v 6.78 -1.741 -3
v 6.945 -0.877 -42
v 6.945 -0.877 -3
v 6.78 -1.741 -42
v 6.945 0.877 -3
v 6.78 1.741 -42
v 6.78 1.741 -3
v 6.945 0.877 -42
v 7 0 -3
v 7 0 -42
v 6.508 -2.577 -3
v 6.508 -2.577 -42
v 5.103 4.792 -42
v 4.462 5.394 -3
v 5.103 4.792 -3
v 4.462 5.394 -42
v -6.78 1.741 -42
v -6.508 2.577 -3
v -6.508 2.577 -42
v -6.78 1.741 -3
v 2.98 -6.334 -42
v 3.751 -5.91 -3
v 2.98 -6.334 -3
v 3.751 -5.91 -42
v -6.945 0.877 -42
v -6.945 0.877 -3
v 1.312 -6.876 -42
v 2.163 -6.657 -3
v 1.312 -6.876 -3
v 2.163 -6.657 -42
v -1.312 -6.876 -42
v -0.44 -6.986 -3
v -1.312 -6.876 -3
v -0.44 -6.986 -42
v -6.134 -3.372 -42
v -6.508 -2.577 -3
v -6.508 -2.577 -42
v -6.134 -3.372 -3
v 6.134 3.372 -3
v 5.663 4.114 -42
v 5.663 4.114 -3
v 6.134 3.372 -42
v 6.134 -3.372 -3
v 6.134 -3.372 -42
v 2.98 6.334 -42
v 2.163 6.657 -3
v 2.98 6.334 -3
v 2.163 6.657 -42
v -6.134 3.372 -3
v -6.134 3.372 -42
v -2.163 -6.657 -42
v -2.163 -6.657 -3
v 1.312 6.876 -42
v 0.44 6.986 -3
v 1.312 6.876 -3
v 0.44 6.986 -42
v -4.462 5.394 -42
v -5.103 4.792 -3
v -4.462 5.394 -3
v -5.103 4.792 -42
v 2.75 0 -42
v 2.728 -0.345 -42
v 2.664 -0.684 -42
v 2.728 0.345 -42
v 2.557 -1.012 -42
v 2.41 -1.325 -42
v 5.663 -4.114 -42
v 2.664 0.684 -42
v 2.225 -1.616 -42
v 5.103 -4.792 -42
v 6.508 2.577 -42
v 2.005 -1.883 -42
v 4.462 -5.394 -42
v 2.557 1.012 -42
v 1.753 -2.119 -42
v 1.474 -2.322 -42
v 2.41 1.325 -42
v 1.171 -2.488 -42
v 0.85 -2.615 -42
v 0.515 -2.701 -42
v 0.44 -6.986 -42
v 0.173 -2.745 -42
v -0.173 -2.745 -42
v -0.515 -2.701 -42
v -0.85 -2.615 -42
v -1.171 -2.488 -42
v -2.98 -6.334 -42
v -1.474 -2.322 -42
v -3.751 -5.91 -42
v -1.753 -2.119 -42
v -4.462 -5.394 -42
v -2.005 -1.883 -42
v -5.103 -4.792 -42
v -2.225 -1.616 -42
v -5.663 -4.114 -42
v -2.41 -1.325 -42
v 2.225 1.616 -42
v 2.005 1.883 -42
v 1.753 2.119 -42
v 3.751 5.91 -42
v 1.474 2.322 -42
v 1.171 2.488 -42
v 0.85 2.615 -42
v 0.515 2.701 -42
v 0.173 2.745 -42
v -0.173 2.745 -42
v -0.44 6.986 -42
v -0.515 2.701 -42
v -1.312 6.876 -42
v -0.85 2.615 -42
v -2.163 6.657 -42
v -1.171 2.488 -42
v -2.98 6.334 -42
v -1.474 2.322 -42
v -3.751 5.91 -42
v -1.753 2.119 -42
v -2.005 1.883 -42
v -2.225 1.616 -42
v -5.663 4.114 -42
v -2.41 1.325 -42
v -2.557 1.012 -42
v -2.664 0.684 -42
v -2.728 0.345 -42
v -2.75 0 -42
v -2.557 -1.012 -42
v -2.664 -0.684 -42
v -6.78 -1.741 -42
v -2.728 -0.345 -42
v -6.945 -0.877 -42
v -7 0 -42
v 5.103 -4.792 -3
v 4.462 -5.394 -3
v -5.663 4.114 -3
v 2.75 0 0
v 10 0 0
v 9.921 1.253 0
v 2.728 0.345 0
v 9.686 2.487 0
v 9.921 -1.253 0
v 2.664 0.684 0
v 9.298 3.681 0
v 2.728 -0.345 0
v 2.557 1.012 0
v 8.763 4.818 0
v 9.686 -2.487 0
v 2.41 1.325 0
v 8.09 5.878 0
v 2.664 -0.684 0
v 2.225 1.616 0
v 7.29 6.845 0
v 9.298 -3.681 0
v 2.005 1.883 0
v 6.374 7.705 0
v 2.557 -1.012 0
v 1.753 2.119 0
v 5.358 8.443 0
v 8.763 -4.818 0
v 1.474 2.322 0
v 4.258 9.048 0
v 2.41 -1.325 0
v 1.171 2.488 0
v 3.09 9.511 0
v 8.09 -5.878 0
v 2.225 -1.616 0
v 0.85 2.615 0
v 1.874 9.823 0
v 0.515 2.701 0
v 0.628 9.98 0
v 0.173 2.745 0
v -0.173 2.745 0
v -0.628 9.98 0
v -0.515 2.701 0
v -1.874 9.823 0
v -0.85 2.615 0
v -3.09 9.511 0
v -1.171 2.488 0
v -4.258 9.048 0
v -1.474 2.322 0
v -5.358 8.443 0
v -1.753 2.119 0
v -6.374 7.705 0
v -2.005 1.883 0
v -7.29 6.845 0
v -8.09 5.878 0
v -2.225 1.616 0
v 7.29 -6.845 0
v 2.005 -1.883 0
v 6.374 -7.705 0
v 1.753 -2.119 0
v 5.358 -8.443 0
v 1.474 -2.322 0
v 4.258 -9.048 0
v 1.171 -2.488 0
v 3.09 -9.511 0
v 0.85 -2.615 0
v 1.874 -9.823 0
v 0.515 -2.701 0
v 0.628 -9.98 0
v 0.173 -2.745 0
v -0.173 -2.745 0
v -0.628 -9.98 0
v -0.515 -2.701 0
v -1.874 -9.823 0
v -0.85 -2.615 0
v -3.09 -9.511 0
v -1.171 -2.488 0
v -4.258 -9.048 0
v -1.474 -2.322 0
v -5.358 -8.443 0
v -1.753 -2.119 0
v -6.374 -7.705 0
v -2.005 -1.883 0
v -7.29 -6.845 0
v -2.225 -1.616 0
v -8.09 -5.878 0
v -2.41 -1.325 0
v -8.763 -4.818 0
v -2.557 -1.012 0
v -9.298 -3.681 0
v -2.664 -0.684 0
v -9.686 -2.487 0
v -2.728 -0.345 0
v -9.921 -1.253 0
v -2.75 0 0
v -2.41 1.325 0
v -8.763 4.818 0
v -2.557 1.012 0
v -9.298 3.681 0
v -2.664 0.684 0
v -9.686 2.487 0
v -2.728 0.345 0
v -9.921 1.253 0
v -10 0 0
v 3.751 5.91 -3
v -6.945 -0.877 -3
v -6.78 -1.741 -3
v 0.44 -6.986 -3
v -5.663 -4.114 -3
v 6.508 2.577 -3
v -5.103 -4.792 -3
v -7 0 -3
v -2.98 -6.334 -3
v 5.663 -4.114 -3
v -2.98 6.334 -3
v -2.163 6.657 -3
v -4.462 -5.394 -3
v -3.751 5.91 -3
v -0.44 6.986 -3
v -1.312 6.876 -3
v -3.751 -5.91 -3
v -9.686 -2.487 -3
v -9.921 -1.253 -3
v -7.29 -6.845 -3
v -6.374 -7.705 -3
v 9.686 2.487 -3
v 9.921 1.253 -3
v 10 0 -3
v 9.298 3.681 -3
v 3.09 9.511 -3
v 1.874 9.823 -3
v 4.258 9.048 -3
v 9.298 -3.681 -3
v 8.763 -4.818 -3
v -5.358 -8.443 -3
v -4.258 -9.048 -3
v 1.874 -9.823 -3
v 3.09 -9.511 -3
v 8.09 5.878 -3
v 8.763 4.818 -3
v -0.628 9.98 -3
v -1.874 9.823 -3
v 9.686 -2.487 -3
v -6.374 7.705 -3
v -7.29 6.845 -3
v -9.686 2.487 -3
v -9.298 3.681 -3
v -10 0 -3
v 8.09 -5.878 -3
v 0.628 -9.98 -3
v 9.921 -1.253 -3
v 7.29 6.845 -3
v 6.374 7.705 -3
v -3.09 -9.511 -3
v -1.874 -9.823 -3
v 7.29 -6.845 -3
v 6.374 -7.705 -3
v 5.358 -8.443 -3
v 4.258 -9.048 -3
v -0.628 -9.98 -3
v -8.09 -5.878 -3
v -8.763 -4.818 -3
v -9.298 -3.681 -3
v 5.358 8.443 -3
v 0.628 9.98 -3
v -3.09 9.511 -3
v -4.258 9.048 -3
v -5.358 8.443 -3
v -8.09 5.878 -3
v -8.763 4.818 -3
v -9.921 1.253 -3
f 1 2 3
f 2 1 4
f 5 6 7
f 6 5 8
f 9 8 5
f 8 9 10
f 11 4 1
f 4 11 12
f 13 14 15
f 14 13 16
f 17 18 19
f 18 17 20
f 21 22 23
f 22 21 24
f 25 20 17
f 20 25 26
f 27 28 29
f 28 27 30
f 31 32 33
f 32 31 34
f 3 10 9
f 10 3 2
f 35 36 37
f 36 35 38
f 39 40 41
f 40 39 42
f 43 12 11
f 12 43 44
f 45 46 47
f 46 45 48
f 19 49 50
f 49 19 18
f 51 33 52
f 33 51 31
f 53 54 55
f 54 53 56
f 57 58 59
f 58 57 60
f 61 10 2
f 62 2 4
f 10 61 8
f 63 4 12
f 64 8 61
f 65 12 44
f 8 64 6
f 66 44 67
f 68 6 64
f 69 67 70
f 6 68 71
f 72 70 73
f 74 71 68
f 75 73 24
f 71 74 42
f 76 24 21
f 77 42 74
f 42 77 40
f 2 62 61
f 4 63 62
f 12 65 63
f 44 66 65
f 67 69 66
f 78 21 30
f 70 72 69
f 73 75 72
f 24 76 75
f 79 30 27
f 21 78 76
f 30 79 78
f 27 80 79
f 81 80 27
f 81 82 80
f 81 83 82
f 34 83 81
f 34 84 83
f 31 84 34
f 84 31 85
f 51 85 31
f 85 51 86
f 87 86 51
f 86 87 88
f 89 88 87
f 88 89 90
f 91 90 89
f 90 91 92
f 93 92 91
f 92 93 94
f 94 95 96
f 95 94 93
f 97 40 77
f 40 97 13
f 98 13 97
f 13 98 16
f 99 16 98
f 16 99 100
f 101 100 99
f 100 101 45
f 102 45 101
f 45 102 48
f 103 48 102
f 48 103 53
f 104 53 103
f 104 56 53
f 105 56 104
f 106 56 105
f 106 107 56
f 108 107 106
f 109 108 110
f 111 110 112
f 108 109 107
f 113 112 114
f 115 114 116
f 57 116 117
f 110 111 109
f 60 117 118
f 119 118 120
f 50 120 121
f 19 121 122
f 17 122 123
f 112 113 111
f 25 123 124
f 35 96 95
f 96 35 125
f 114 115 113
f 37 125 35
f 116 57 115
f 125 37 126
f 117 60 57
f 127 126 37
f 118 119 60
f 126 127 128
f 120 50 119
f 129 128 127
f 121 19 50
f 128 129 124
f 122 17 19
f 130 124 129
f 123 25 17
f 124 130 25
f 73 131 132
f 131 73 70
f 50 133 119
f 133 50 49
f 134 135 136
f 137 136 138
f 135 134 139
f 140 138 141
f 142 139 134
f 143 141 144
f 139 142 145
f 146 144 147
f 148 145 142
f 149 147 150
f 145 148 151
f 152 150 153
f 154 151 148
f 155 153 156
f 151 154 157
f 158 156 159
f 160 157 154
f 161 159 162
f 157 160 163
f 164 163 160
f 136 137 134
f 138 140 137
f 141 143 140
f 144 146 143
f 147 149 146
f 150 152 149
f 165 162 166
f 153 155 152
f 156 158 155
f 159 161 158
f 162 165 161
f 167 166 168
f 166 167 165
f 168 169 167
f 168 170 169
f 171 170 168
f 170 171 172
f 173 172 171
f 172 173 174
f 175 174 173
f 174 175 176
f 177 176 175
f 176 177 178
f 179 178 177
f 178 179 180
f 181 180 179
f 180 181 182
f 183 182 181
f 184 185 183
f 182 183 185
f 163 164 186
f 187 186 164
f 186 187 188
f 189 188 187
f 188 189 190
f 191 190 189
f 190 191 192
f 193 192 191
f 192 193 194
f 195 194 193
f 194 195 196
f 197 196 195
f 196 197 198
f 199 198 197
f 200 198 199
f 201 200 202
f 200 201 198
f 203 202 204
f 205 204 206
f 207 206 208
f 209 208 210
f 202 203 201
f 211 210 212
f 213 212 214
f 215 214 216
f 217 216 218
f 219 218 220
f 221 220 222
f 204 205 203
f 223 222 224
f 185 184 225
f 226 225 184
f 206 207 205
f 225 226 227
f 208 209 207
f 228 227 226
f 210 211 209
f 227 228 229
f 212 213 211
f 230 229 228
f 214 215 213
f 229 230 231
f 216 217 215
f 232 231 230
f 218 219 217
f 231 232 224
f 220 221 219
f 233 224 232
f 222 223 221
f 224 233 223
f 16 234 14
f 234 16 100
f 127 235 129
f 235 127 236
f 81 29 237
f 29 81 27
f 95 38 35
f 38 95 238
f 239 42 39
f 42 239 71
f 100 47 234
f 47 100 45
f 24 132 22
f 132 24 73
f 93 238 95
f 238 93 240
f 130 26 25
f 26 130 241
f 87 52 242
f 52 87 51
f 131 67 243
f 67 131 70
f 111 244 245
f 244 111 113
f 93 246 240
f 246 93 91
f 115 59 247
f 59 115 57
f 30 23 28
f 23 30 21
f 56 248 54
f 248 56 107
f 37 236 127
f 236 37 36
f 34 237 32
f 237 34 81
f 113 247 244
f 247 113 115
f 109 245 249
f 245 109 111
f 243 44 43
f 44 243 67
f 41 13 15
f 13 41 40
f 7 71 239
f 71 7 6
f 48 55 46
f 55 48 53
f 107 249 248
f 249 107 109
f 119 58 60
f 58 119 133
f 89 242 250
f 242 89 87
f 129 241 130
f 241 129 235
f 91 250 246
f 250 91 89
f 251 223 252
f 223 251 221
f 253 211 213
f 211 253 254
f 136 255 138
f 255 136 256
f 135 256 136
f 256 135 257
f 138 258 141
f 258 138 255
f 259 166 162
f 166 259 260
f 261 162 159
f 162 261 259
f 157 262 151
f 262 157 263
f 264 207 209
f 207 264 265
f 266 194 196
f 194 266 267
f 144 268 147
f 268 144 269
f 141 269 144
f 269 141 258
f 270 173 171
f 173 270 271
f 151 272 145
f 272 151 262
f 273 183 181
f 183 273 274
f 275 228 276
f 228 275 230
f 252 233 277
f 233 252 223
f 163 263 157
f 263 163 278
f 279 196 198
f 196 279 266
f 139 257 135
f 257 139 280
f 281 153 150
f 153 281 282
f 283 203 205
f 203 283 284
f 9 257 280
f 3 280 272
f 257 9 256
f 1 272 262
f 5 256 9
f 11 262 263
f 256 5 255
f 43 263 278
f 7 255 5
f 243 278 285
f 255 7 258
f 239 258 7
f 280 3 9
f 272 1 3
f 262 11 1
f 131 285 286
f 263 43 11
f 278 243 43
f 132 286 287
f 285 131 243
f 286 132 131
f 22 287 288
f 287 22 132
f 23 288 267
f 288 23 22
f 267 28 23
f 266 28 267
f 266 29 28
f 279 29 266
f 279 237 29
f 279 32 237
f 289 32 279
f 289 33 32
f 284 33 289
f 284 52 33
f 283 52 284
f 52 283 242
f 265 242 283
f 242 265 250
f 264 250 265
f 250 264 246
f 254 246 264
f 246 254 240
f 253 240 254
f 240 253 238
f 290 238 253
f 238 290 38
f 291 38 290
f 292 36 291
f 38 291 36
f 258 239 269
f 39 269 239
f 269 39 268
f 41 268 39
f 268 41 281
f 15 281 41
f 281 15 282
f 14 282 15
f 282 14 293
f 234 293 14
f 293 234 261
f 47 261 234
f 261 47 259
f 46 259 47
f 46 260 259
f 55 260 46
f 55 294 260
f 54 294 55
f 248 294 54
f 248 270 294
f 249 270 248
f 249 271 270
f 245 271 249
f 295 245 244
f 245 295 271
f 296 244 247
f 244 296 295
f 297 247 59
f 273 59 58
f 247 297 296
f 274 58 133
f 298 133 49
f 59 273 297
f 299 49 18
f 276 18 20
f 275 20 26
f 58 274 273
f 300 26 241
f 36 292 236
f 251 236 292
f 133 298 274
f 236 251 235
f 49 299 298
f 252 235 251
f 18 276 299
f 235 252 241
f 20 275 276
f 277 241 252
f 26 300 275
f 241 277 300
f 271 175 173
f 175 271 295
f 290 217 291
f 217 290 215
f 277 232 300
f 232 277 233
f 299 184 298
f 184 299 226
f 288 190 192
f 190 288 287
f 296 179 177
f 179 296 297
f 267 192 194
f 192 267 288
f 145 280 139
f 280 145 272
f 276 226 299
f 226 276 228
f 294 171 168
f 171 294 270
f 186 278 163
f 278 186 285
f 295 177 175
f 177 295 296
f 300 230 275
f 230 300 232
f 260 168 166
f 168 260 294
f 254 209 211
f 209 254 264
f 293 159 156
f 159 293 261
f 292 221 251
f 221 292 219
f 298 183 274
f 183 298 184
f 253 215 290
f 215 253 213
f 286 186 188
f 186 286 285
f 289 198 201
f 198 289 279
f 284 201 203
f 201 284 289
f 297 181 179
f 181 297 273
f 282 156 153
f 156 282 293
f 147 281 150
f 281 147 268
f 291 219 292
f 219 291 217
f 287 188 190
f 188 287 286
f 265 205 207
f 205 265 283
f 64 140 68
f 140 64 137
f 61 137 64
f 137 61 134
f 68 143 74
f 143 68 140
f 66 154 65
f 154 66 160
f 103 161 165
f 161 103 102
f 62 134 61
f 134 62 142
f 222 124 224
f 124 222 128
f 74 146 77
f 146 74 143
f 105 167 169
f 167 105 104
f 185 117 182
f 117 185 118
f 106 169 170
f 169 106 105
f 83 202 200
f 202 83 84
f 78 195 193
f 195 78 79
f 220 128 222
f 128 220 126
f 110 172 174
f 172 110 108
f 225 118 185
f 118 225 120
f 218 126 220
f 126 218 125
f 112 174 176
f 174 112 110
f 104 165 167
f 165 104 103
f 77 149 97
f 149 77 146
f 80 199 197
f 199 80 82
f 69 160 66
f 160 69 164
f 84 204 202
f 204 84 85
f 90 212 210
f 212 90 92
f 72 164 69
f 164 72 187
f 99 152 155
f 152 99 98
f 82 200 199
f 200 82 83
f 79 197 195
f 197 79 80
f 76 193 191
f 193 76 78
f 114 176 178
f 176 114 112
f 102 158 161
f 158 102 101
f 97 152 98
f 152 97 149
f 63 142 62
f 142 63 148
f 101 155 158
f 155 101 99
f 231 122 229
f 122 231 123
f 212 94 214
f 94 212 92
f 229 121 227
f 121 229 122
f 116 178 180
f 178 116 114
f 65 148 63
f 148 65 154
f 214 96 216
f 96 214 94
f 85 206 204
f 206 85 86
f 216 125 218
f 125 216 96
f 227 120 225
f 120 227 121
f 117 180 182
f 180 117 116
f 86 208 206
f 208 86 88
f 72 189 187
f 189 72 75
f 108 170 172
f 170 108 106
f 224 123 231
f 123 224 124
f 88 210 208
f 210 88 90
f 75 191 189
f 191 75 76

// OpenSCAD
$fn = 50;


difference() {
	union() {
		translate(v = [0, 0, -42.0000000000]) {
			cylinder(h = 42, r = 7.0000000000);
		}
		translate(v = [0, 0, -3.0000000000]) {
			cylinder(h = 3, r = 10.0000000000);
		}
	}
	union() {
		#translate(v = [0, 0, -42]) {
			cylinder(h = 42, r = 2.7500000000);
		}
	}
}
